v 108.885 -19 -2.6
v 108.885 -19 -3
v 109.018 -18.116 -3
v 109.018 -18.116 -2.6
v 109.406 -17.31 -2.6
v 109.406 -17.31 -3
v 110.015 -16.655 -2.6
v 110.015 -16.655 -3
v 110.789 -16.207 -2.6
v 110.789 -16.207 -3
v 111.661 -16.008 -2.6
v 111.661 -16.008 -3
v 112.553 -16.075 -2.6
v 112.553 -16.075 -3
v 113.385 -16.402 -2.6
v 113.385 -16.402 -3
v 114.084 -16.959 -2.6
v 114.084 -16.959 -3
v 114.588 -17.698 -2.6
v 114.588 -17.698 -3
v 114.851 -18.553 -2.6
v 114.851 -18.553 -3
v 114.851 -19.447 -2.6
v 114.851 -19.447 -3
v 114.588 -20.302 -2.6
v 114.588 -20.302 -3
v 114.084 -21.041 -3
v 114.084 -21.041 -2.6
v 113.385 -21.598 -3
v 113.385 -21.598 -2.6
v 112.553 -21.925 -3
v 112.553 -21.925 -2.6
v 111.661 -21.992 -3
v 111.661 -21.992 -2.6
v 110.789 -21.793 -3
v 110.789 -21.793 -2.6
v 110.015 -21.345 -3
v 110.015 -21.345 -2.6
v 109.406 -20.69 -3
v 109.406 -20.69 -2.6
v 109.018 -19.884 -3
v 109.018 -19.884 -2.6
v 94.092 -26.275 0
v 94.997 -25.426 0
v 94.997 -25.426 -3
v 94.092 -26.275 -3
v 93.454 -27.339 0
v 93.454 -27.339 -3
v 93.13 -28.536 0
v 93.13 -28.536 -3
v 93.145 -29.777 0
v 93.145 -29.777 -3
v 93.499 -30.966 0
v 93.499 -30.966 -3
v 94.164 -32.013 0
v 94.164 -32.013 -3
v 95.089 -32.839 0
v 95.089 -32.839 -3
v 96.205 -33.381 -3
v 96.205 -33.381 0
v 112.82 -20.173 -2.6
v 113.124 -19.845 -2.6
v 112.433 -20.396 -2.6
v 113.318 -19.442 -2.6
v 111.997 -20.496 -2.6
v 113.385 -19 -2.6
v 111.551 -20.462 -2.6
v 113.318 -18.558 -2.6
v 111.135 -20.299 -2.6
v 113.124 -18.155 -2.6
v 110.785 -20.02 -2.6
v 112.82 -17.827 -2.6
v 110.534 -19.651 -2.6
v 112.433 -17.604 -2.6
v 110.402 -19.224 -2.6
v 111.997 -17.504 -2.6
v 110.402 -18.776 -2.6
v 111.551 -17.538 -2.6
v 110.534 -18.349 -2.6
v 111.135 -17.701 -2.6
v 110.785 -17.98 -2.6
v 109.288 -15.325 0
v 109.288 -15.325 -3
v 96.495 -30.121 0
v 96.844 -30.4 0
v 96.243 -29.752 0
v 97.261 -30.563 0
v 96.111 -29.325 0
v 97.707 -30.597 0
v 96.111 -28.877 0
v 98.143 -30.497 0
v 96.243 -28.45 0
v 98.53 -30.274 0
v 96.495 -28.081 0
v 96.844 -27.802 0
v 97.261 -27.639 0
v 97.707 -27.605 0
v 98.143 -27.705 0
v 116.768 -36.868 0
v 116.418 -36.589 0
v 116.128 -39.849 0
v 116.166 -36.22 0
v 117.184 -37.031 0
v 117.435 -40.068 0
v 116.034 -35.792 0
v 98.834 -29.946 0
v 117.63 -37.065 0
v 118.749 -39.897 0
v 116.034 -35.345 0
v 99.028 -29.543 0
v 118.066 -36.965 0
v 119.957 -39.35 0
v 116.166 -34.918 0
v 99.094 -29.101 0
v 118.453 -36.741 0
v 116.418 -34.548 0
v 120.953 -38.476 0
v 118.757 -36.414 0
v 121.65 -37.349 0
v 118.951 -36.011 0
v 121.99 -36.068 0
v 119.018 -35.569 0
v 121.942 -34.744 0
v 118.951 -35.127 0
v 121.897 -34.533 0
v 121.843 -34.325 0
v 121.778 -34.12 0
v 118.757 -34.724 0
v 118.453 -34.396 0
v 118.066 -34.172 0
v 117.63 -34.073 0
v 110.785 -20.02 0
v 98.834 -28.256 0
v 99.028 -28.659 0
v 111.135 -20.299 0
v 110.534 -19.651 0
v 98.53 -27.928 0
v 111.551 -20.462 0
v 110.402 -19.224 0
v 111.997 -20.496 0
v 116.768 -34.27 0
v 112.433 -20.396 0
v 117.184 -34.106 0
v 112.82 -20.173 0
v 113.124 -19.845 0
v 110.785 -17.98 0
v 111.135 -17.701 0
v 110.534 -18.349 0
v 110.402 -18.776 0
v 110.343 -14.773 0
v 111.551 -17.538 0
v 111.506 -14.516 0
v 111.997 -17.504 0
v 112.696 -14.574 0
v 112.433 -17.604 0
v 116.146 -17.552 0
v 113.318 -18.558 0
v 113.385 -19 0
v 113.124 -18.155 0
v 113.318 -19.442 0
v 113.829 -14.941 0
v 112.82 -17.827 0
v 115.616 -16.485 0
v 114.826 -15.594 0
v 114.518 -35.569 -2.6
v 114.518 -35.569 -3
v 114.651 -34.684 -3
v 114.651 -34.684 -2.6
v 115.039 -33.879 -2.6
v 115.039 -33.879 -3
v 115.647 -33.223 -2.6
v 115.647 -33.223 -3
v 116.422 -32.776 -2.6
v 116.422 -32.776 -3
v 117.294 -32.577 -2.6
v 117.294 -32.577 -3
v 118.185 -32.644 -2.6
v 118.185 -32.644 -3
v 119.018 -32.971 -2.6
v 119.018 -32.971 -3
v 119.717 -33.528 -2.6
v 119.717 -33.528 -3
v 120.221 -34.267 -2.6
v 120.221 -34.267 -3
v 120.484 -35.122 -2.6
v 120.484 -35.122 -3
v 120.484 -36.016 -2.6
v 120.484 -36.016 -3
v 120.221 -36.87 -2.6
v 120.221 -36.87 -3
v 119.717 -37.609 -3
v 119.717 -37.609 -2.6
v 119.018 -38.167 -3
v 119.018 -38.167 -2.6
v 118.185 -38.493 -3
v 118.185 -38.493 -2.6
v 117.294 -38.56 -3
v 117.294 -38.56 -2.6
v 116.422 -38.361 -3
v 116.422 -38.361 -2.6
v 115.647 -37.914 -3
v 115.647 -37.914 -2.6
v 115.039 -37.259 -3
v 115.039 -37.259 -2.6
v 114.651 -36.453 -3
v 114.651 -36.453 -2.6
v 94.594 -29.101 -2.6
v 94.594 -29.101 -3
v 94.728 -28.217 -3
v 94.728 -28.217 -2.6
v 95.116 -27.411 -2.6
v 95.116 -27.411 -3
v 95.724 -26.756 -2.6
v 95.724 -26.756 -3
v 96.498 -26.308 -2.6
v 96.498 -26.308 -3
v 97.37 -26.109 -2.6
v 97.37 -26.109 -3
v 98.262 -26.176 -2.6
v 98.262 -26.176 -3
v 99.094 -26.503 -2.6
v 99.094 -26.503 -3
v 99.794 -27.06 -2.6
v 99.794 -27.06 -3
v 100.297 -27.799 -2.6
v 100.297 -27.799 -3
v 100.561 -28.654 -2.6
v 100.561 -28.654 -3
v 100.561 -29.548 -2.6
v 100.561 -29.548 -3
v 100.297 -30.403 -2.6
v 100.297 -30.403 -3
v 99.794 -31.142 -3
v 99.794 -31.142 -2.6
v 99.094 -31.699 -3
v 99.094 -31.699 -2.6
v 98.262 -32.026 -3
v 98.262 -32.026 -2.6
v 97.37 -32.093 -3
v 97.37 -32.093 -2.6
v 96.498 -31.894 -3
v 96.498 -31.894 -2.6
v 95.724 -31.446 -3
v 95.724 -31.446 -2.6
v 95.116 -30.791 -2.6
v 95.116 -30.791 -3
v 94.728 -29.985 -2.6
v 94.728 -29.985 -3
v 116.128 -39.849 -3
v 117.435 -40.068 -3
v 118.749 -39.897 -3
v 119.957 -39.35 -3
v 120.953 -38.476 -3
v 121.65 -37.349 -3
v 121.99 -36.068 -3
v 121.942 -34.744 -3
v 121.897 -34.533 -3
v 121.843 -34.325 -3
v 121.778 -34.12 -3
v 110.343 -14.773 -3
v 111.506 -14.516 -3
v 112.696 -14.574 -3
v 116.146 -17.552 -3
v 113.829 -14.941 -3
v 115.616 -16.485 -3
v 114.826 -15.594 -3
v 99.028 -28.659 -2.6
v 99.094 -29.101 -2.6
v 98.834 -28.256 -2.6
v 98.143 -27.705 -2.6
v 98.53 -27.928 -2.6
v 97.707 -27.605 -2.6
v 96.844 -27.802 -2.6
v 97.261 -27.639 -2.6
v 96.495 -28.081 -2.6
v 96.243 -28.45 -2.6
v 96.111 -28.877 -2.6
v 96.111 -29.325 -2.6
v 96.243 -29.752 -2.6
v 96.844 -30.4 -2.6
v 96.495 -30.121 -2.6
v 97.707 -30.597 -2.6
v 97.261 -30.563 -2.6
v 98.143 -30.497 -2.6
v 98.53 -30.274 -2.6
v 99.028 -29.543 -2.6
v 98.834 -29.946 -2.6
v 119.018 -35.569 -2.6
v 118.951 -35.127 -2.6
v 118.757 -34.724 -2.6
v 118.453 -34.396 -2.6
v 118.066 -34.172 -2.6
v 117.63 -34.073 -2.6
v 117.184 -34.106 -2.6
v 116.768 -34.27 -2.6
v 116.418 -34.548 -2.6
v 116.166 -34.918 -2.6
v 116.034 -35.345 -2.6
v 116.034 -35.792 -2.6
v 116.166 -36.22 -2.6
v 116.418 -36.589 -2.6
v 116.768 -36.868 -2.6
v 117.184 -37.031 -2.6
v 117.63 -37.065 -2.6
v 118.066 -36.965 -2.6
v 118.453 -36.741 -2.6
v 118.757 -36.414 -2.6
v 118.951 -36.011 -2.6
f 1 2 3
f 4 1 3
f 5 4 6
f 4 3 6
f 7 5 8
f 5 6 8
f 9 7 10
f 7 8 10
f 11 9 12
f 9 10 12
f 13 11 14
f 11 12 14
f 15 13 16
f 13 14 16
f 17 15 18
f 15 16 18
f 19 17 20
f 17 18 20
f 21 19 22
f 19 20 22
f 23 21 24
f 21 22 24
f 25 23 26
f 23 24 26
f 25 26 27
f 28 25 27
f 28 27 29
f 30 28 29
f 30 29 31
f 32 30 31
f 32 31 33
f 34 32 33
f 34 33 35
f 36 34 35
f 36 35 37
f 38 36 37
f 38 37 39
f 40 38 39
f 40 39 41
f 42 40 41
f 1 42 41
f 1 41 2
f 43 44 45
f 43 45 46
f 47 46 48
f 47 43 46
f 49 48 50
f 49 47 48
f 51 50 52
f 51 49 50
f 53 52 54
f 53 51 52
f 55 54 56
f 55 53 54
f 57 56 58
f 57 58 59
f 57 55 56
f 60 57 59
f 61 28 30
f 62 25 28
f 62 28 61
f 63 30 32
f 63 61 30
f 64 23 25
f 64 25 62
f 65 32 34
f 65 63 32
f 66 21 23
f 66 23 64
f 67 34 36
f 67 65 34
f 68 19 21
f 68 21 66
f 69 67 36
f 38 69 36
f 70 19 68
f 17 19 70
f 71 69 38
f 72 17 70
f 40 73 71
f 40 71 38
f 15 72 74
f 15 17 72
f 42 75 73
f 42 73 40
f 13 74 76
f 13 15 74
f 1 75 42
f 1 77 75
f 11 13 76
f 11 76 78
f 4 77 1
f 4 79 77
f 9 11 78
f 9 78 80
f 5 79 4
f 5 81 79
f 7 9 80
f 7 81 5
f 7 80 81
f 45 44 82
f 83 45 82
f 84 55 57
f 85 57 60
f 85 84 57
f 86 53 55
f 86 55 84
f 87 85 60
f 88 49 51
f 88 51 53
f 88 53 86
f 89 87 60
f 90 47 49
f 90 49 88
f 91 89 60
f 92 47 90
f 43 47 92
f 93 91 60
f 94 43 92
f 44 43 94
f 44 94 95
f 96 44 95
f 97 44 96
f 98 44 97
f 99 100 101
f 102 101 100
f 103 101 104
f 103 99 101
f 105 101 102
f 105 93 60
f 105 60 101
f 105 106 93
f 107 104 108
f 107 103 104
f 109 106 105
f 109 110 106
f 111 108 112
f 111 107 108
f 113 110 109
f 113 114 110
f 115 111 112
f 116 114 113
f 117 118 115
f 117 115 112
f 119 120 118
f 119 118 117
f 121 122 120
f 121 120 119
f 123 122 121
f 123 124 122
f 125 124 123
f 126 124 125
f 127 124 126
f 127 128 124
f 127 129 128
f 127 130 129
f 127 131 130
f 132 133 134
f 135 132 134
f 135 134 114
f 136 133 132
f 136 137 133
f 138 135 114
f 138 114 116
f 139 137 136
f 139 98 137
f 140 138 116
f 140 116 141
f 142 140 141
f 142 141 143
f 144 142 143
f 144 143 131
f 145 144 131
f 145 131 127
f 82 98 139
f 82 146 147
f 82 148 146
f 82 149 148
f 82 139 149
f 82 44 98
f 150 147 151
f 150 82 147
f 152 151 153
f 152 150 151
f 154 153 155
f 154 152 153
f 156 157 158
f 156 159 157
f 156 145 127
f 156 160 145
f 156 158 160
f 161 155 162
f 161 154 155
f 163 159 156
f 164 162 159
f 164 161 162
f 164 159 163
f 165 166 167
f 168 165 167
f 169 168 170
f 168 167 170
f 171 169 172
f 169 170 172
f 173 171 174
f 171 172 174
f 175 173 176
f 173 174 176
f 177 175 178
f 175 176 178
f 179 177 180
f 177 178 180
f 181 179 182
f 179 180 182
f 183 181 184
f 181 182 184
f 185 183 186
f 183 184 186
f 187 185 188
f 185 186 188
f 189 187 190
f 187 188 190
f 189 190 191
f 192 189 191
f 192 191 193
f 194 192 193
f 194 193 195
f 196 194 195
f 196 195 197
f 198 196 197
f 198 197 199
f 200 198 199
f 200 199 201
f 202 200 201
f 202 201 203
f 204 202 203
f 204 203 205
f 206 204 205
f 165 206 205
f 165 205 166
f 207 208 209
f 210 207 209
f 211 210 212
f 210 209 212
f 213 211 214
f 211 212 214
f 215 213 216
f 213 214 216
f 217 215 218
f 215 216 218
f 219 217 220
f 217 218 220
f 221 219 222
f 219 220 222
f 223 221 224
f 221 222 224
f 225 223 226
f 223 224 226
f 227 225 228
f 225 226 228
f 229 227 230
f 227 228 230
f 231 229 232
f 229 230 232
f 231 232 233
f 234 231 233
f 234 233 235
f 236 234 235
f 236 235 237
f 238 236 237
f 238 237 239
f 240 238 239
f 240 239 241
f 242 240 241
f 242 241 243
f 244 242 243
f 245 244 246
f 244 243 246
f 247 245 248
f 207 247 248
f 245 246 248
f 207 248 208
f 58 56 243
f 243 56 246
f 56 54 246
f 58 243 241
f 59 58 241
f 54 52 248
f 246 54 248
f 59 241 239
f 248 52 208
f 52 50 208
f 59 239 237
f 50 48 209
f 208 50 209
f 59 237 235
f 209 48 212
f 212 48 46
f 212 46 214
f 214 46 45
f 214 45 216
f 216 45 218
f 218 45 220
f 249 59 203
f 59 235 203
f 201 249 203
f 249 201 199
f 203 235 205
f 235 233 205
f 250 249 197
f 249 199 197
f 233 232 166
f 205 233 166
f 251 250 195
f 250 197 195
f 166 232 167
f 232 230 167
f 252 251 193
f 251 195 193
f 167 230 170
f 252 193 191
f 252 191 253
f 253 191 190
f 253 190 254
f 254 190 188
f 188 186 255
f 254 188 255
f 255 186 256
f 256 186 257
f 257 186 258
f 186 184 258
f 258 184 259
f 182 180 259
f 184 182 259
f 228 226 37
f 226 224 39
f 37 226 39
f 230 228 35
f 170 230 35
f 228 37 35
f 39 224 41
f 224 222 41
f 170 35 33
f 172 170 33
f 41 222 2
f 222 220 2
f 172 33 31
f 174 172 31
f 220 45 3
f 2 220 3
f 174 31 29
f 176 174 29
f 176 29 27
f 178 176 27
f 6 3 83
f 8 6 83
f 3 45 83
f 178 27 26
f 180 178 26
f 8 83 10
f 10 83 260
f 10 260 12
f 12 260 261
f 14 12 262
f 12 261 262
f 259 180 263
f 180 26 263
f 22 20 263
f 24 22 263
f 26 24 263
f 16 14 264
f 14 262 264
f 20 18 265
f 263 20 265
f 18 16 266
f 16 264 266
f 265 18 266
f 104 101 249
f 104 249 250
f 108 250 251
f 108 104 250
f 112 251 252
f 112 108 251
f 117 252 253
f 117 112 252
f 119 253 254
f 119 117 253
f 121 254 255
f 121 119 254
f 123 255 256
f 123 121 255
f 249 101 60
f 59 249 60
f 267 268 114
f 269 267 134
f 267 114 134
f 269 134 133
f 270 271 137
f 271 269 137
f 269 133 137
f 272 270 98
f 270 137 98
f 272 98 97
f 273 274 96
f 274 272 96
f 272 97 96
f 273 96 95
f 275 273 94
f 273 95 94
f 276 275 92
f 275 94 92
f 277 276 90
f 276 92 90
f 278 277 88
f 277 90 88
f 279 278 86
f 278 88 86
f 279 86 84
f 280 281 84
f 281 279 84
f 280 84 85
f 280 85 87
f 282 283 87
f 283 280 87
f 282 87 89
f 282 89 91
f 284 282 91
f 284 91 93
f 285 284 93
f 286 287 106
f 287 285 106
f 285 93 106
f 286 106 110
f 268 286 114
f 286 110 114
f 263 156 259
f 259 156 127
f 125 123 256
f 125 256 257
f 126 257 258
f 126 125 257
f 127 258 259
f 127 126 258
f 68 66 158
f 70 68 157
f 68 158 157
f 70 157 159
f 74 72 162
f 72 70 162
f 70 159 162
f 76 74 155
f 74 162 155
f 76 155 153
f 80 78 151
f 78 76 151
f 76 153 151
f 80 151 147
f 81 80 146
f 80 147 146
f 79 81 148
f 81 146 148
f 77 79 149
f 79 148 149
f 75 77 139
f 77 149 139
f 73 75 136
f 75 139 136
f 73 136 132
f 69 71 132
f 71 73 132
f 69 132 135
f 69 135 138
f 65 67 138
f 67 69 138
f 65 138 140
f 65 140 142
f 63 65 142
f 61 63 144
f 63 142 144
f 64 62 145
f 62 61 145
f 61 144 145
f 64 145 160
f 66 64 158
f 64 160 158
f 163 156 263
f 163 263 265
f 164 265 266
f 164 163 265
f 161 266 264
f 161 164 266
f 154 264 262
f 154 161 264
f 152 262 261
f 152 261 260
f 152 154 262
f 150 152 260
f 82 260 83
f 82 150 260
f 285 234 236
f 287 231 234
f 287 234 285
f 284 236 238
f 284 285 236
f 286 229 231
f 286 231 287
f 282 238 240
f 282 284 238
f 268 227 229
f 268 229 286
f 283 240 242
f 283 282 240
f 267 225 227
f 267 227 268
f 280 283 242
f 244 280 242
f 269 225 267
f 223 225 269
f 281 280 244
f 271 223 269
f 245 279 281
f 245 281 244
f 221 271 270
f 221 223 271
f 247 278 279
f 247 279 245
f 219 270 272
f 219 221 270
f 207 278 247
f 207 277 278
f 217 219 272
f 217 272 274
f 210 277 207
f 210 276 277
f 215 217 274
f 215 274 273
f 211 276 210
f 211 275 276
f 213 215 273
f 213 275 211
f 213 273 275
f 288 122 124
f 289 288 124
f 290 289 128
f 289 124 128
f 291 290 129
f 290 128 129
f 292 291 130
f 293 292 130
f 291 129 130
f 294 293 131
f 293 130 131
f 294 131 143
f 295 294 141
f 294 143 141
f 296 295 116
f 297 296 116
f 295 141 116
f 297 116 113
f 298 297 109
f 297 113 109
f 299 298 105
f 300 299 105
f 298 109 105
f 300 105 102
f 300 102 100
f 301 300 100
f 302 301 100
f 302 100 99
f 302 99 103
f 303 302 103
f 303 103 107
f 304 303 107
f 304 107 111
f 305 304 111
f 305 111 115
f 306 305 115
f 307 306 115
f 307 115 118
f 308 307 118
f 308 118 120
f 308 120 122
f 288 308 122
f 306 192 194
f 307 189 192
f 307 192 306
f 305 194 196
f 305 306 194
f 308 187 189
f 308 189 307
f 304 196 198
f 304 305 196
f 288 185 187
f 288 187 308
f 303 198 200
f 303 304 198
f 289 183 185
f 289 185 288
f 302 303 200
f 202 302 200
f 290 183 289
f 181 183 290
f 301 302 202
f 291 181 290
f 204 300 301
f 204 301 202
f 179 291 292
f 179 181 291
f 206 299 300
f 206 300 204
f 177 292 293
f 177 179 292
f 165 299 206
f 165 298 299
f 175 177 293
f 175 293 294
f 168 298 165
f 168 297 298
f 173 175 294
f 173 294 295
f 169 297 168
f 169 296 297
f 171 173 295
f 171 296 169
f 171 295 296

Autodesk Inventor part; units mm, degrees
ref_plane "YZ Plane" through (0, 0, 0) normal (1, 0, 0) x (0, 1, 0)
ref_plane "XZ Plane" through (0, 0, 0) normal (0, 1, 0) x (-1, 0, 0)
ref_plane "XY Plane" through (0, 0, 0) normal (0, 0, 1) x (1, 0, 0)
sketch "スケッチ1" plane through (0, 0, 0) normal (0, 0, 1) x (1, 0, 0)
  circle A0 centre (117.5177, -35.5687) radius 1.5
  circle A1 centre (95.4507, -12.9865) radius 1.5
  circle A2 centre (97.5945, -29.101) radius 1.5
  circle A3 centre (111.885, -19) radius 1.5
  line L0 (116.6369, -13.86) -> (104.8897, -3)
  line L1 (104.8897, -3) -> (101.885, -3)
  arc A4 (99.885, -3) -> (101.885, -3) centre (100.885, -3) ccw
  line L2 (99.885, -3) -> (99.885, 0)
  line L3 (99.885, 0) -> (84.885, 0)
  line L4 (84.885, 0) -> (84.885, -3)
  arc A5 (82.885, -3) -> (84.885, -3) centre (83.885, -3) ccw
  line L5 (82.885, -3) -> (81.4397, -3)
  arc A6 (79.4397, -3) -> (81.4397, -3) centre (80.4397, -3) ccw
  line L6 (79.4397, -3) -> (79.4397, 0)
  line L7 (79.4397, 0) -> (64.4397, 0)
  line L8 (64.4397, 0) -> (64.4397, -3)
  arc A7 (62.4397, -3) -> (64.4397, -3) centre (63.4397, -3) ccw
  line L9 (62.4397, -3) -> (59.4397, -3)
  line L10 (59.4397, -3) -> (59.4397, -6)
  line L11 (59.4397, -6) -> (65.1115, -8.2188)
  arc A8 (65.1115, -8.2188) -> (69.3788, -9.8882) centre (68.4397, -6) ccw
  line L12 (69.3788, -9.8882) -> (97.5091, -20.8927)
  arc A9 (97.5091, -20.8927) -> (98.5543, -24.7045) centre (111.885, -19) ccw
  arc A10 (98.5543, -24.7045) -> (97.6262, -33.6009) centre (97.5945, -29.101) ccw
  line L13 (97.6262, -33.6009) -> (107.1669, -33.5336)
  line L14 (107.1669, -33.5336) -> (114.849, -39.192)
  arc A11 (114.849, -39.192) -> (121.9415, -34.7438) centre (117.5177, -35.5687) ccw
  line L15 (121.9415, -34.7438) -> (118.7664, -17.7168)
  arc A12 (118.7664, -17.7168) -> (116.6369, -13.86) centre (111.885, -19) ccw
  line L16 (69.4397, -3) -> (74.4397, -3)
  arc A13 (76.4397, -3) -> (74.4397, -3) centre (75.4397, -3) ccw
  line L17 (76.4397, -3) -> (76.4397, -6)
  arc A14 (74.4397, -6) -> (76.4397, -6) centre (75.4397, -6) ccw
  line L18 (74.4397, -6) -> (69.4397, -6)
  arc A15 (67.4397, -6) -> (69.4397, -6) centre (68.4397, -6) ccw
  line L19 (67.4397, -6) -> (67.4397, -3)
  arc A16 (69.4397, -3) -> (67.4397, -3) centre (68.4397, -3) ccw
  arc A17 (94.885, -6) -> (96.885, -6) centre (95.885, -6) ccw
  line L20 (94.885, -6) -> (89.885, -6)
  arc A18 (87.885, -6) -> (89.885, -6) centre (88.885, -6) ccw
  line L21 (87.885, -6) -> (87.885, -3)
  arc A19 (89.885, -3) -> (87.885, -3) centre (88.885, -3) ccw
  line L22 (89.885, -3) -> (94.885, -3)
  arc A20 (96.885, -3) -> (94.885, -3) centre (95.885, -3) ccw
  line L23 (96.885, -3) -> (96.885, -6)
  circle A21 centre (97.5945, -29.101) radius 4.5
  circle A22 centre (111.885, -19) radius 4.5
  circle A23 centre (117.5177, -35.5687) radius 4.5
  line L24 (94.9971, -25.4263) -> (109.2877, -15.3253)
  line L25 (116.1456, -17.5516) -> (121.7783, -34.1203)
  line L26 (116.1283, -39.8488) -> (96.205, -33.3811)
  point P0 (0, 0)
  point P1 (0, 0)
  dimension "d0" = 9
extrude "押し出し1" add sketch "スケッチ1" against normal blind 3 contours A11 A23 | A23 L14 L13 A21 A9 L24 A22 L25 | L26 A10 L13 L14 A11 | A22 | A10 A21 | L24 A9 A10
sketch "スケッチ2" plane through (0, 0, -3) normal (0, 0, -1) x (-1, 0, 0)
  line L0 (-94.9971, -25.4263) -> (-109.2877, -15.3253) projected
  arc A0 (-109.2877, -15.3253) -> (-116.1456, -17.5516) centre (-111.885, -19) ccw projected
  line L1 (-116.1456, -17.5516) -> (-121.7783, -34.1203) projected
  arc A1 (-121.7783, -34.1203) -> (-116.1283, -39.8488) centre (-117.5177, -35.5687) ccw projected
  line L2 (-116.1283, -39.8488) -> (-96.205, -33.3811) projected
  arc A2 (-96.205, -33.3811) -> (-94.9971, -25.4263) centre (-97.5945, -29.101) ccw projected
  circle A3 centre (-111.885, -19) radius 1.5 projected
  circle A4 centre (-97.5945, -29.101) radius 1.5 projected
  circle A5 centre (-117.5177, -35.5687) radius 1.5 projected
  circle A6 centre (-97.5945, -29.101) radius 1.5 projected
  circle A7 centre (-97.5945, -29.101) radius 3
  circle A8 centre (-111.885, -19) radius 1.5 projected
  circle A9 centre (-111.885, -19) radius 3
  circle A10 centre (-117.5177, -35.5687) radius 1.5 projected
  circle A11 centre (-117.5177, -35.5687) radius 3
  point P0 (0, 0)
  dimension "d3" = 6
  dimension "d4" = 6
  dimension "d6" = 6
extrude "押し出し2" cut sketch "スケッチ2" against normal blind 0.4 contours A5 | A7 | A9 | A11
properties part number "後ろウィング固定フレーム押さえ"
